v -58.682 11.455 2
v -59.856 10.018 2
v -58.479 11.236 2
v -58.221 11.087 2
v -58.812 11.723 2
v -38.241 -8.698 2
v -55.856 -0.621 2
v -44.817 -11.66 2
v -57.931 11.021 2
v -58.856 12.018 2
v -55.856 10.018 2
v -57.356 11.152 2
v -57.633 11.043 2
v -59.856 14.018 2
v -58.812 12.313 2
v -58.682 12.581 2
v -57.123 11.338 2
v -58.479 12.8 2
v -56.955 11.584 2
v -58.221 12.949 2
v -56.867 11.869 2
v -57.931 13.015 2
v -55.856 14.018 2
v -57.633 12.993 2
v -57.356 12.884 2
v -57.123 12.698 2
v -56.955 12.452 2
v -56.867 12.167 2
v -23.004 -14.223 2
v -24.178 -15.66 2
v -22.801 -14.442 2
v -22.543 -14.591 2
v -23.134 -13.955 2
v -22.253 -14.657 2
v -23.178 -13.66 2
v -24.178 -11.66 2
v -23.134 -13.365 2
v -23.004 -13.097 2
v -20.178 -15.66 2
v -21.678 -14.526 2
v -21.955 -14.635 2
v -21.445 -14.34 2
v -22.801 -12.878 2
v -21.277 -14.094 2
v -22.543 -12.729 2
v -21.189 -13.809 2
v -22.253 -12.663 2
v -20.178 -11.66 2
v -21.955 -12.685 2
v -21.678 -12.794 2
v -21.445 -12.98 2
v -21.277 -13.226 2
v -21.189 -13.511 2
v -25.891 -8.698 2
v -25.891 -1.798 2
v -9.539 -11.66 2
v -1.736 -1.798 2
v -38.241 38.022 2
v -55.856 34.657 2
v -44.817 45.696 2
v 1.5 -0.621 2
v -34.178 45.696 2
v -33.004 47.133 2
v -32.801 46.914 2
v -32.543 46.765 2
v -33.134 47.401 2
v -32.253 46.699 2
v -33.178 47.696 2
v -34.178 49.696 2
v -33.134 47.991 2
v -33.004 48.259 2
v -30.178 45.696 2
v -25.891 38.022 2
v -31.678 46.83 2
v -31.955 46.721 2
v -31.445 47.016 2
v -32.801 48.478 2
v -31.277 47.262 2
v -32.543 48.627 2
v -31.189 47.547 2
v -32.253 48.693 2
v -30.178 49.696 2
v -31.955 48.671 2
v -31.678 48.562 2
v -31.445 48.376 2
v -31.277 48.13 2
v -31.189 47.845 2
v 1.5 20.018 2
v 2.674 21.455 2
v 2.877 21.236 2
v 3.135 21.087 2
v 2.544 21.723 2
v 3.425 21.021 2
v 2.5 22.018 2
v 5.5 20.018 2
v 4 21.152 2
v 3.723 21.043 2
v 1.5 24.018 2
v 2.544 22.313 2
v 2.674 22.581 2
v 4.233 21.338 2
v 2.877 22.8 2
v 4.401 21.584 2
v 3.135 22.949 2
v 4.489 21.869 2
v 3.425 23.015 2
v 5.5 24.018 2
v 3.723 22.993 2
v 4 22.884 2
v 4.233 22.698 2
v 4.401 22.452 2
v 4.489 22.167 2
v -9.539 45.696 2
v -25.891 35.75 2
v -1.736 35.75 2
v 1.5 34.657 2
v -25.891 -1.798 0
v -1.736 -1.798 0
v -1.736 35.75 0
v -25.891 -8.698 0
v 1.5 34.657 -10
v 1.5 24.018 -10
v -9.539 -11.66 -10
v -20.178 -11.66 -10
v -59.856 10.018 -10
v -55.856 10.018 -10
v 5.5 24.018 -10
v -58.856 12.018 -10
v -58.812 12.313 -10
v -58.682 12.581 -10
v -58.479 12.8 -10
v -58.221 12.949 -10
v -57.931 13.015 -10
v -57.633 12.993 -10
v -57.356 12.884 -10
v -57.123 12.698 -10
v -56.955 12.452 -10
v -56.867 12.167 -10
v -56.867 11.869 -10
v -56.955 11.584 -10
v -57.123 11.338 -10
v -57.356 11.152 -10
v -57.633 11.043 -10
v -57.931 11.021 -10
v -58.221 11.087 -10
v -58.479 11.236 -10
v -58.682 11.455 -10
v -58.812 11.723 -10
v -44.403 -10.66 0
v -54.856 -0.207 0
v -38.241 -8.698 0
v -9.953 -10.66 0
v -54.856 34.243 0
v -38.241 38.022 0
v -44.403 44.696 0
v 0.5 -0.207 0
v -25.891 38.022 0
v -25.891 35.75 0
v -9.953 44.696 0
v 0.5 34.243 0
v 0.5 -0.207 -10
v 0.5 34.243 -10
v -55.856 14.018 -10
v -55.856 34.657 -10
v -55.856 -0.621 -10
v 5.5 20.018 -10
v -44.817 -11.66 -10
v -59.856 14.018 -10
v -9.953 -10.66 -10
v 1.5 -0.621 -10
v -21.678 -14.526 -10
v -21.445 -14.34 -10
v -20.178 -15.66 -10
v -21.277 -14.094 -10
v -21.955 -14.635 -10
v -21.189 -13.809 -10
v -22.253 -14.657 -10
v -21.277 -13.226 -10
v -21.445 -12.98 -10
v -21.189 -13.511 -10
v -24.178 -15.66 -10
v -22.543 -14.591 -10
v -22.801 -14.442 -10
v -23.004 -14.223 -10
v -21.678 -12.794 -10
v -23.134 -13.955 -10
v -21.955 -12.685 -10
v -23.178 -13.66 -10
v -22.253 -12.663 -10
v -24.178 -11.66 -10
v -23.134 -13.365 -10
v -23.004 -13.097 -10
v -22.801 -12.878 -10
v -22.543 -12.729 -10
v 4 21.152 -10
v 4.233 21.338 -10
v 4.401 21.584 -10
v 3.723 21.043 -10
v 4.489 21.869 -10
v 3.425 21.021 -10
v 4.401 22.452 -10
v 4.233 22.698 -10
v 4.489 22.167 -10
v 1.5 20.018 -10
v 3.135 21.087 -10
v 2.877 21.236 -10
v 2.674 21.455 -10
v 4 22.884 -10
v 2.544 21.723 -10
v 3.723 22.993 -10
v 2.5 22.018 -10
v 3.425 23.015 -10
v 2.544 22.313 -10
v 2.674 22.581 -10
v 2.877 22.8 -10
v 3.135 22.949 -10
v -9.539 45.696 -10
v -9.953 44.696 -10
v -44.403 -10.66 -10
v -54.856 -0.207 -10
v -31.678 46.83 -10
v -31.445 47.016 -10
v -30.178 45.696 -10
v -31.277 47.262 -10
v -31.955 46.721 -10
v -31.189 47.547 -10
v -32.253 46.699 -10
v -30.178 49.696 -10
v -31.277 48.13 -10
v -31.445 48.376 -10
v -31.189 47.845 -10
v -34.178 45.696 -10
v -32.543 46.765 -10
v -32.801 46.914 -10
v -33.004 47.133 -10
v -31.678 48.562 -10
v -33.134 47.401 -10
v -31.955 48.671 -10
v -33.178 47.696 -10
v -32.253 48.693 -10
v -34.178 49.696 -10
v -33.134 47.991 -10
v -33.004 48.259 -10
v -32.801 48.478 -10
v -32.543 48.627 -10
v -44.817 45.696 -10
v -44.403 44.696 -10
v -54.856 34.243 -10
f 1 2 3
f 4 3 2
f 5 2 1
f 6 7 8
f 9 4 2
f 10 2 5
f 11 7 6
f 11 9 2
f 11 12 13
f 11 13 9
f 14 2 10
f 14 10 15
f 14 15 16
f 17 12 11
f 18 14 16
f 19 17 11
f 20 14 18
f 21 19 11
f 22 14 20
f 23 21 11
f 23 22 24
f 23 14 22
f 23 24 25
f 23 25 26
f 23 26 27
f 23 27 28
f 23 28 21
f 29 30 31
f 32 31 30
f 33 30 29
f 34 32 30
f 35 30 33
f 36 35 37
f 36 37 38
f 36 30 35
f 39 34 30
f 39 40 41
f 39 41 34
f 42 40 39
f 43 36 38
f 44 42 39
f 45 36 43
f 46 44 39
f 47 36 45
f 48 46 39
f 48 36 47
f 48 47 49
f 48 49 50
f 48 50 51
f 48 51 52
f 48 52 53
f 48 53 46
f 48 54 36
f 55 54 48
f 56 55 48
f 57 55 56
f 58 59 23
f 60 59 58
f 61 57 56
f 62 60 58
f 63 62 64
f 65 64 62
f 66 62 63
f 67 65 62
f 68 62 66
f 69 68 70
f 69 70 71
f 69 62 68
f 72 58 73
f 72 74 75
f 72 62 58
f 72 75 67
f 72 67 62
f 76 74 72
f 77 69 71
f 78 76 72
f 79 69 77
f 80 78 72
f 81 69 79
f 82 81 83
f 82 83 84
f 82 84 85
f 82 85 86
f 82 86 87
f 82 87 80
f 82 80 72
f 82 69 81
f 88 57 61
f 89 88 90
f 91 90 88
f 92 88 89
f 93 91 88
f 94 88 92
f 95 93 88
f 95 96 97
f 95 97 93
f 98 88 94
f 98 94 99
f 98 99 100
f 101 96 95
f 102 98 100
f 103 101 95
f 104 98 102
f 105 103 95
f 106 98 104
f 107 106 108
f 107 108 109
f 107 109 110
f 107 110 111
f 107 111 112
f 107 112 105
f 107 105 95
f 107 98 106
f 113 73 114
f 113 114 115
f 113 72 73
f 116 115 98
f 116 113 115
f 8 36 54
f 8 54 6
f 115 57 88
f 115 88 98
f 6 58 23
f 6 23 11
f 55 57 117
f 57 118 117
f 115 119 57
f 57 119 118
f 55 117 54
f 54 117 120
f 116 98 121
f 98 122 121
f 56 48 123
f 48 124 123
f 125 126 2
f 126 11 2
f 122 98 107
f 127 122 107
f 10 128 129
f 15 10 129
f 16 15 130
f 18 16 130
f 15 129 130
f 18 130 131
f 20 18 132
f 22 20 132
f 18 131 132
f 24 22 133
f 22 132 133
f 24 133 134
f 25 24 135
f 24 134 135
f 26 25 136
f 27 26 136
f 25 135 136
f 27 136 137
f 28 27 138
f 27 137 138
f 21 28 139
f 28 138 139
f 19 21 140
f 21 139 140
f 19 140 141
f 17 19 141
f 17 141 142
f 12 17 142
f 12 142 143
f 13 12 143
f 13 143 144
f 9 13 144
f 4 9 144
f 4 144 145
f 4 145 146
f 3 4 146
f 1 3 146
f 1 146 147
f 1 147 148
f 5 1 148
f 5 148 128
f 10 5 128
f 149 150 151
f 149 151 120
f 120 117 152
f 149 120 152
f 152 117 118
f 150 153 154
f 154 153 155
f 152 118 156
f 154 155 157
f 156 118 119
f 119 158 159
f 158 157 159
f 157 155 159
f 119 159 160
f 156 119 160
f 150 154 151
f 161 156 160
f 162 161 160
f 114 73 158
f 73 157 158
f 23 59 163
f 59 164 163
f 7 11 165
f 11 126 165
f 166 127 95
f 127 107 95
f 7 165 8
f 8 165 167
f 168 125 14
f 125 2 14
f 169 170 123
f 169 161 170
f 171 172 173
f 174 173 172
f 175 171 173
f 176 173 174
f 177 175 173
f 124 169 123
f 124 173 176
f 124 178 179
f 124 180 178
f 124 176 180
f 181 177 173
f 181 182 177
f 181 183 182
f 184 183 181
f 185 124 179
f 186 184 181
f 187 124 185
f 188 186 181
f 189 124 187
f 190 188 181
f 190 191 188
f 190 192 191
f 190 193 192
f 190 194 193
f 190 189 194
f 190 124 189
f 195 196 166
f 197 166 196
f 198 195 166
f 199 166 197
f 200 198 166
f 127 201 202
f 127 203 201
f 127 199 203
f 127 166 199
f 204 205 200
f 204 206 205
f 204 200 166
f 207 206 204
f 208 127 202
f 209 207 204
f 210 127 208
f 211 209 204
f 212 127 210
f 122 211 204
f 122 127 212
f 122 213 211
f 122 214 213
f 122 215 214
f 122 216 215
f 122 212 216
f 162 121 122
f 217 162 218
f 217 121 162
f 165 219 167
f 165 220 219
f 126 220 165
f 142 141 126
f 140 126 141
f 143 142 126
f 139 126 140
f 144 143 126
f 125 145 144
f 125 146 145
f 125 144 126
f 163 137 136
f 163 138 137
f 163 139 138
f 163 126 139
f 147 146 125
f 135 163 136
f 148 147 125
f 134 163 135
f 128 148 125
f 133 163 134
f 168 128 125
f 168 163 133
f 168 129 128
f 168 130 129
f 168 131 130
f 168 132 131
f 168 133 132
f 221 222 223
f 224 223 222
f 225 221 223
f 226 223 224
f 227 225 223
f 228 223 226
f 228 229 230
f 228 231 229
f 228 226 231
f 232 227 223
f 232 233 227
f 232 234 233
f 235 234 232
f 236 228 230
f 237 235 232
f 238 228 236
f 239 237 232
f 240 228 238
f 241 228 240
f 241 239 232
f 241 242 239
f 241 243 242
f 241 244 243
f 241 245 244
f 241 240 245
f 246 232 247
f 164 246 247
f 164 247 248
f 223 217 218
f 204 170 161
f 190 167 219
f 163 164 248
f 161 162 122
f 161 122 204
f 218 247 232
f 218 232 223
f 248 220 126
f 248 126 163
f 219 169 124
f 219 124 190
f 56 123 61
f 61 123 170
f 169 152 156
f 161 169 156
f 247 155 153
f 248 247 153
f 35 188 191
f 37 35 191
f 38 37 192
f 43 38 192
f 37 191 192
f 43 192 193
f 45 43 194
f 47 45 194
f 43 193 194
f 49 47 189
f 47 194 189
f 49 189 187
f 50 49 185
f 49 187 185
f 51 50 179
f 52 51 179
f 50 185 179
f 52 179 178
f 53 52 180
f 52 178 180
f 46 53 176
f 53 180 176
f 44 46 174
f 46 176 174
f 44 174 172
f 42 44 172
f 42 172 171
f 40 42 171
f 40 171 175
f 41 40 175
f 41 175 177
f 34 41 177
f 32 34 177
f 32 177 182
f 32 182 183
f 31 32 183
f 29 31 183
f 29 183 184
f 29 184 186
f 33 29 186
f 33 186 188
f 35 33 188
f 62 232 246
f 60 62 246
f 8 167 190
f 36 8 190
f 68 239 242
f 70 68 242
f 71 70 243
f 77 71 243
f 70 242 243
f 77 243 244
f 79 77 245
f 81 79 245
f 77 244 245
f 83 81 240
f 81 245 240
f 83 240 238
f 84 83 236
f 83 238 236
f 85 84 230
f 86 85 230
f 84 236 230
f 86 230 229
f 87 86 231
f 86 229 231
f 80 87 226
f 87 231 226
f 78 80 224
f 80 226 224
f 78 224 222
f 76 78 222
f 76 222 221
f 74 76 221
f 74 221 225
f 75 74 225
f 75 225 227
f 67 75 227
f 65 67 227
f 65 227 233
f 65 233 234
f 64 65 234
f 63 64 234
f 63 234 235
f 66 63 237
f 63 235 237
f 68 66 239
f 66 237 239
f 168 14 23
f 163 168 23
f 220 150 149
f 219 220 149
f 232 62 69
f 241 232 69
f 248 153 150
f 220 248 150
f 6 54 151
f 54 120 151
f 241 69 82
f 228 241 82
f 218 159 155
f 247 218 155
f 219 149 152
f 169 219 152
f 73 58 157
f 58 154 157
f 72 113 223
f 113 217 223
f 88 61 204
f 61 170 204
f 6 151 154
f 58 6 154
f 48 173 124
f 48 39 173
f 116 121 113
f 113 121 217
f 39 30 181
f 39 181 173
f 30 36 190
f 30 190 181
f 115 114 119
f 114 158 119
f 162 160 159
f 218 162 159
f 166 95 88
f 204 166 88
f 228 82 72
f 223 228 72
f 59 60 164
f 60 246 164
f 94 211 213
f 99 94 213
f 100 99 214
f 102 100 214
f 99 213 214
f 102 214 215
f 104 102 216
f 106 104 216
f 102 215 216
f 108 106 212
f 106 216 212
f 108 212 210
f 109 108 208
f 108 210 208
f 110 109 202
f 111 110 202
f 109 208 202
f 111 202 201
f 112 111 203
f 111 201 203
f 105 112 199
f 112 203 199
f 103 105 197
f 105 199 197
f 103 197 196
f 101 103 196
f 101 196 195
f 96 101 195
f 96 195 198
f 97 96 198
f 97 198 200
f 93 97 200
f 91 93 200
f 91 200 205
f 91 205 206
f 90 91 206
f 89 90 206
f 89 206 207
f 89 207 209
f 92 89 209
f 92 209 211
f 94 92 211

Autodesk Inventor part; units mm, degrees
ref_plane "YZ Plane" through (0, 0, 0) normal (1, 0, 0) x (0, 1, 0)
ref_plane "XZ Plane" through (0, 0, 0) normal (0, 1, 0) x (-1, 0, 0)
ref_plane "XY Plane" through (0, 0, 0) normal (0, 0, 1) x (1, 0, 0)
sketch "Эскиз1" plane through (0, 0, 0) normal (0, 0, 1) x (1, 0, 0)
  line L0 (0, 34.036) -> (-10.16, 44.196) construction
  line L1 (0, 0) -> (0, 34.036) construction
  line L2 (-10.16, -10.16) -> (0, 0) construction
  line L3 (-44.196, -10.16) -> (-10.16, -10.16) construction
  line L4 (-54.356, 0) -> (-44.196, -10.16) construction
  line L5 (-54.356, 34.036) -> (-54.356, 0) construction
  line L6 (-44.196, 44.196) -> (-54.356, 34.036) construction
  line L7 (-10.16, 44.196) -> (-44.196, 44.196) construction
  line L8 (1.5, -0.6213) -> (1.5, 34.6573)
  line L9 (1.5, 34.6573) -> (-9.5387, 45.696)
  line L10 (-9.5387, 45.696) -> (-44.8173, 45.696)
  line L11 (-44.8173, 45.696) -> (-55.856, 34.6573)
  line L12 (-55.856, 34.6573) -> (-55.856, -0.6213)
  line L13 (-55.856, -0.6213) -> (-44.8173, -11.66)
  line L14 (-44.8173, -11.66) -> (-9.5387, -11.66)
  line L15 (-9.5387, -11.66) -> (1.5, -0.6213)
  line L16 (-2.7356, -0.7983) -> (-25.2842, -0.7983) construction
  line L17 (-2.7356, 34.7503) -> (-2.7356, -0.7983) construction
  line L18 (-25.2842, 34.7503) -> (-2.7356, 34.7503) construction
  line L19 (-25.2842, -0.7983) -> (-25.2842, 34.7503) construction
  line L20 (-35.7877, 37.522) -> (-26.3913, 37.522) construction
  line L21 (-35.7877, -8.198) -> (-26.3913, -8.198) construction
  line L22 (-26.3913, -0.578) -> (-26.3913, -5.658) construction
  line L23 (-37.7413, -0.578) -> (-37.7413, -5.658) construction
  line L24 (-1.7356, -1.7983) -> (-26.2842, -1.7983)
  line L25 (-26.2842, -1.7983) -> (-26.2842, 35.7503)
  line L26 (-26.2842, 35.7503) -> (-1.7356, 35.7503)
  line L27 (-1.7356, 35.7503) -> (-1.7356, -1.7983)
  line L28 (-26.3913, 37.522) -> (-37.7413, 37.522) construction
  line L29 (-37.7413, 37.522) -> (-37.7413, -8.198) construction
  line L30 (-37.7413, -8.198) -> (-26.3913, -8.198) construction
  line L31 (-26.3913, -8.198) -> (-26.3913, 37.522) construction
  line L32 (-38.2413, 38.022) -> (-25.8913, 38.022)
  line L33 (-25.8913, 38.022) -> (-25.8913, -8.698)
  line L34 (-25.8913, -8.698) -> (-38.2413, -8.698)
  line L35 (-38.2413, -8.698) -> (-38.2413, 38.022)
  point P0 (-25.8913, -1.7983)
  point P1 (-25.8913, 35.7503)
  dimension "d0" = 1.5
  dimension "d1" = 1
  dimension "d2" = 0.5
extrude "Выдавливание1" add sketch "Эскиз1" along normal blind 2
sketch "Эскиз2" plane through (0, 0, 0) normal (0, 0, -1) x (-1, 0, 0)
  line L0 (-1.5, 34.6573) -> (9.5387, 45.696) construction
  line L1 (-1.5, -0.6213) -> (-1.5, 34.6573) construction
  line L2 (9.5387, -11.66) -> (-1.5, -0.6213) construction
  line L3 (44.8173, -11.66) -> (9.5387, -11.66) construction
  line L4 (55.856, -0.6213) -> (44.8173, -11.66) construction
  line L5 (55.856, 34.6573) -> (55.856, -0.6213) construction
  line L6 (44.8173, 45.696) -> (55.856, 34.6573) construction
  line L7 (9.5387, 45.696) -> (44.8173, 45.696) construction
  line L8 (1.7356, 35.7503) -> (1.7356, -1.7983) construction
  line L9 (25.8913, 35.7503) -> (1.7356, 35.7503) construction
  line L10 (25.8913, 38.022) -> (25.8913, 35.7503) construction
  line L11 (38.2413, 38.022) -> (25.8913, 38.022) construction
  line L12 (38.2413, -8.698) -> (38.2413, 38.022) construction
  line L13 (25.8913, -8.698) -> (38.2413, -8.698) construction
  line L14 (25.8913, -1.7983) -> (25.8913, -8.698) construction
  line L15 (1.7356, -1.7983) -> (25.8913, -1.7983) construction
  line L16 (-0.5, 34.2431) -> (9.9529, 44.696)
  line L17 (9.9529, 44.696) -> (44.4031, 44.696)
  line L18 (44.4031, 44.696) -> (54.856, 34.2431)
  line L19 (54.856, 34.2431) -> (54.856, -0.2071)
  line L20 (54.856, -0.2071) -> (44.4031, -10.66)
  line L21 (44.4031, -10.66) -> (9.9529, -10.66)
  line L22 (9.9529, -10.66) -> (-0.5, -0.2071)
  line L23 (-0.5, -0.2071) -> (-0.5, 34.2431)
  line L24 (-1.5, 34.6573) -> (9.5387, 45.696)
  line L25 (9.5387, 45.696) -> (44.8173, 45.696)
  line L26 (44.8173, 45.696) -> (55.856, 34.6573)
  line L27 (55.856, 34.6573) -> (55.856, -0.6213)
  line L28 (55.856, -0.6213) -> (44.8173, -11.66)
  line L29 (44.8173, -11.66) -> (9.5387, -11.66)
  line L30 (9.5387, -11.66) -> (-1.5, -0.6213)
  line L31 (-1.5, -0.6213) -> (-1.5, 34.6573)
  point P0 (0, 0)
  dimension "d0" = 1.5
  dimension "d5" = 1
  dimension "d6" = 1
extrude "Выдавливание2" add sketch "Эскиз2" along normal blind 10
sketch "Эскиз3" plane through (0, 0, 2) normal (0, 0, 1) x (1, 0, 0)
  line L0 (-44.8173, -11.66) -> (-9.5387, -11.66) construction
  line L1 (-9.5387, 45.696) -> (-44.8173, 45.696) construction
  line L2 (-55.856, 34.6573) -> (-55.856, -0.6213) construction
  line L3 (1.5, -0.6213) -> (1.5, 34.6573) construction
  line L4 (-20.178, -11.66) -> (-24.178, -11.66)
  line L5 (-24.178, -11.66) -> (-24.178, -15.66)
  line L6 (-24.178, -15.66) -> (-20.178, -15.66)
  line L7 (-20.178, -15.66) -> (-20.178, -11.66)
  line L8 (-30.178, 45.696) -> (-34.178, 45.696)
  line L9 (-34.178, 45.696) -> (-34.178, 49.696)
  line L10 (-34.178, 49.696) -> (-30.178, 49.696)
  line L11 (-30.178, 49.696) -> (-30.178, 45.696)
  line L12 (1.5, 24.018) -> (5.5, 24.018)
  line L13 (5.5, 24.018) -> (5.5, 20.018)
  line L14 (5.5, 20.018) -> (1.5, 20.018)
  line L15 (1.5, 20.018) -> (1.5, 24.018)
  line L16 (-55.856, 10.018) -> (-59.856, 10.018)
  line L17 (-59.856, 10.018) -> (-59.856, 14.018)
  line L18 (-59.856, 14.018) -> (-55.856, 14.018)
  line L19 (-55.856, 14.018) -> (-55.856, 10.018)
  point P0 (0, 0)
  point P1 (-27.178, -11.66)
  point P2 (1.5, 17.018)
  point P3 (-55.856, 17.018)
  point P4 (-27.178, 45.696)
  dimension "d9" = 4
  dimension "d10" = 4
  dimension "d11" = 3
  dimension "d12" = 4
  dimension "d13" = 4
  dimension "d14" = 4
  dimension "d15" = 4
  dimension "d16" = 4
  dimension "d17" = 4
  dimension "d18" = 3
  dimension "d19" = 3
  dimension "d20" = 3
extrude "Выдавливание3" add sketch "Эскиз3" against normal up to surface (12 mm away)
sketch "Эскиз4" plane through (0, 0, -10) normal (0, 0, -1) x (-1, 0, 0)
  circle A0 centre (-3.5, 22.018) radius 1.5 construction
  circle A1 centre (32.178, 47.696) radius 1.5 construction
  circle A2 centre (57.856, 12.018) radius 1.5 construction
  circle A3 centre (22.178, -13.66) radius 1.5 construction
  circle A4 centre (22.178, -13.66) radius 1
  circle A5 centre (57.856, 12.018) radius 1
  circle A6 centre (32.178, 47.696) radius 1
  circle A7 centre (-3.5, 22.018) radius 1
  point P0 (0, 0)
  dimension "d23" = 2
  dimension "d24" = 2
  dimension "d25" = 2
  dimension "d27" = 2
extrude "Выдавливание4" cut sketch "Эскиз4" against normal through all
properties part number "Низ"
